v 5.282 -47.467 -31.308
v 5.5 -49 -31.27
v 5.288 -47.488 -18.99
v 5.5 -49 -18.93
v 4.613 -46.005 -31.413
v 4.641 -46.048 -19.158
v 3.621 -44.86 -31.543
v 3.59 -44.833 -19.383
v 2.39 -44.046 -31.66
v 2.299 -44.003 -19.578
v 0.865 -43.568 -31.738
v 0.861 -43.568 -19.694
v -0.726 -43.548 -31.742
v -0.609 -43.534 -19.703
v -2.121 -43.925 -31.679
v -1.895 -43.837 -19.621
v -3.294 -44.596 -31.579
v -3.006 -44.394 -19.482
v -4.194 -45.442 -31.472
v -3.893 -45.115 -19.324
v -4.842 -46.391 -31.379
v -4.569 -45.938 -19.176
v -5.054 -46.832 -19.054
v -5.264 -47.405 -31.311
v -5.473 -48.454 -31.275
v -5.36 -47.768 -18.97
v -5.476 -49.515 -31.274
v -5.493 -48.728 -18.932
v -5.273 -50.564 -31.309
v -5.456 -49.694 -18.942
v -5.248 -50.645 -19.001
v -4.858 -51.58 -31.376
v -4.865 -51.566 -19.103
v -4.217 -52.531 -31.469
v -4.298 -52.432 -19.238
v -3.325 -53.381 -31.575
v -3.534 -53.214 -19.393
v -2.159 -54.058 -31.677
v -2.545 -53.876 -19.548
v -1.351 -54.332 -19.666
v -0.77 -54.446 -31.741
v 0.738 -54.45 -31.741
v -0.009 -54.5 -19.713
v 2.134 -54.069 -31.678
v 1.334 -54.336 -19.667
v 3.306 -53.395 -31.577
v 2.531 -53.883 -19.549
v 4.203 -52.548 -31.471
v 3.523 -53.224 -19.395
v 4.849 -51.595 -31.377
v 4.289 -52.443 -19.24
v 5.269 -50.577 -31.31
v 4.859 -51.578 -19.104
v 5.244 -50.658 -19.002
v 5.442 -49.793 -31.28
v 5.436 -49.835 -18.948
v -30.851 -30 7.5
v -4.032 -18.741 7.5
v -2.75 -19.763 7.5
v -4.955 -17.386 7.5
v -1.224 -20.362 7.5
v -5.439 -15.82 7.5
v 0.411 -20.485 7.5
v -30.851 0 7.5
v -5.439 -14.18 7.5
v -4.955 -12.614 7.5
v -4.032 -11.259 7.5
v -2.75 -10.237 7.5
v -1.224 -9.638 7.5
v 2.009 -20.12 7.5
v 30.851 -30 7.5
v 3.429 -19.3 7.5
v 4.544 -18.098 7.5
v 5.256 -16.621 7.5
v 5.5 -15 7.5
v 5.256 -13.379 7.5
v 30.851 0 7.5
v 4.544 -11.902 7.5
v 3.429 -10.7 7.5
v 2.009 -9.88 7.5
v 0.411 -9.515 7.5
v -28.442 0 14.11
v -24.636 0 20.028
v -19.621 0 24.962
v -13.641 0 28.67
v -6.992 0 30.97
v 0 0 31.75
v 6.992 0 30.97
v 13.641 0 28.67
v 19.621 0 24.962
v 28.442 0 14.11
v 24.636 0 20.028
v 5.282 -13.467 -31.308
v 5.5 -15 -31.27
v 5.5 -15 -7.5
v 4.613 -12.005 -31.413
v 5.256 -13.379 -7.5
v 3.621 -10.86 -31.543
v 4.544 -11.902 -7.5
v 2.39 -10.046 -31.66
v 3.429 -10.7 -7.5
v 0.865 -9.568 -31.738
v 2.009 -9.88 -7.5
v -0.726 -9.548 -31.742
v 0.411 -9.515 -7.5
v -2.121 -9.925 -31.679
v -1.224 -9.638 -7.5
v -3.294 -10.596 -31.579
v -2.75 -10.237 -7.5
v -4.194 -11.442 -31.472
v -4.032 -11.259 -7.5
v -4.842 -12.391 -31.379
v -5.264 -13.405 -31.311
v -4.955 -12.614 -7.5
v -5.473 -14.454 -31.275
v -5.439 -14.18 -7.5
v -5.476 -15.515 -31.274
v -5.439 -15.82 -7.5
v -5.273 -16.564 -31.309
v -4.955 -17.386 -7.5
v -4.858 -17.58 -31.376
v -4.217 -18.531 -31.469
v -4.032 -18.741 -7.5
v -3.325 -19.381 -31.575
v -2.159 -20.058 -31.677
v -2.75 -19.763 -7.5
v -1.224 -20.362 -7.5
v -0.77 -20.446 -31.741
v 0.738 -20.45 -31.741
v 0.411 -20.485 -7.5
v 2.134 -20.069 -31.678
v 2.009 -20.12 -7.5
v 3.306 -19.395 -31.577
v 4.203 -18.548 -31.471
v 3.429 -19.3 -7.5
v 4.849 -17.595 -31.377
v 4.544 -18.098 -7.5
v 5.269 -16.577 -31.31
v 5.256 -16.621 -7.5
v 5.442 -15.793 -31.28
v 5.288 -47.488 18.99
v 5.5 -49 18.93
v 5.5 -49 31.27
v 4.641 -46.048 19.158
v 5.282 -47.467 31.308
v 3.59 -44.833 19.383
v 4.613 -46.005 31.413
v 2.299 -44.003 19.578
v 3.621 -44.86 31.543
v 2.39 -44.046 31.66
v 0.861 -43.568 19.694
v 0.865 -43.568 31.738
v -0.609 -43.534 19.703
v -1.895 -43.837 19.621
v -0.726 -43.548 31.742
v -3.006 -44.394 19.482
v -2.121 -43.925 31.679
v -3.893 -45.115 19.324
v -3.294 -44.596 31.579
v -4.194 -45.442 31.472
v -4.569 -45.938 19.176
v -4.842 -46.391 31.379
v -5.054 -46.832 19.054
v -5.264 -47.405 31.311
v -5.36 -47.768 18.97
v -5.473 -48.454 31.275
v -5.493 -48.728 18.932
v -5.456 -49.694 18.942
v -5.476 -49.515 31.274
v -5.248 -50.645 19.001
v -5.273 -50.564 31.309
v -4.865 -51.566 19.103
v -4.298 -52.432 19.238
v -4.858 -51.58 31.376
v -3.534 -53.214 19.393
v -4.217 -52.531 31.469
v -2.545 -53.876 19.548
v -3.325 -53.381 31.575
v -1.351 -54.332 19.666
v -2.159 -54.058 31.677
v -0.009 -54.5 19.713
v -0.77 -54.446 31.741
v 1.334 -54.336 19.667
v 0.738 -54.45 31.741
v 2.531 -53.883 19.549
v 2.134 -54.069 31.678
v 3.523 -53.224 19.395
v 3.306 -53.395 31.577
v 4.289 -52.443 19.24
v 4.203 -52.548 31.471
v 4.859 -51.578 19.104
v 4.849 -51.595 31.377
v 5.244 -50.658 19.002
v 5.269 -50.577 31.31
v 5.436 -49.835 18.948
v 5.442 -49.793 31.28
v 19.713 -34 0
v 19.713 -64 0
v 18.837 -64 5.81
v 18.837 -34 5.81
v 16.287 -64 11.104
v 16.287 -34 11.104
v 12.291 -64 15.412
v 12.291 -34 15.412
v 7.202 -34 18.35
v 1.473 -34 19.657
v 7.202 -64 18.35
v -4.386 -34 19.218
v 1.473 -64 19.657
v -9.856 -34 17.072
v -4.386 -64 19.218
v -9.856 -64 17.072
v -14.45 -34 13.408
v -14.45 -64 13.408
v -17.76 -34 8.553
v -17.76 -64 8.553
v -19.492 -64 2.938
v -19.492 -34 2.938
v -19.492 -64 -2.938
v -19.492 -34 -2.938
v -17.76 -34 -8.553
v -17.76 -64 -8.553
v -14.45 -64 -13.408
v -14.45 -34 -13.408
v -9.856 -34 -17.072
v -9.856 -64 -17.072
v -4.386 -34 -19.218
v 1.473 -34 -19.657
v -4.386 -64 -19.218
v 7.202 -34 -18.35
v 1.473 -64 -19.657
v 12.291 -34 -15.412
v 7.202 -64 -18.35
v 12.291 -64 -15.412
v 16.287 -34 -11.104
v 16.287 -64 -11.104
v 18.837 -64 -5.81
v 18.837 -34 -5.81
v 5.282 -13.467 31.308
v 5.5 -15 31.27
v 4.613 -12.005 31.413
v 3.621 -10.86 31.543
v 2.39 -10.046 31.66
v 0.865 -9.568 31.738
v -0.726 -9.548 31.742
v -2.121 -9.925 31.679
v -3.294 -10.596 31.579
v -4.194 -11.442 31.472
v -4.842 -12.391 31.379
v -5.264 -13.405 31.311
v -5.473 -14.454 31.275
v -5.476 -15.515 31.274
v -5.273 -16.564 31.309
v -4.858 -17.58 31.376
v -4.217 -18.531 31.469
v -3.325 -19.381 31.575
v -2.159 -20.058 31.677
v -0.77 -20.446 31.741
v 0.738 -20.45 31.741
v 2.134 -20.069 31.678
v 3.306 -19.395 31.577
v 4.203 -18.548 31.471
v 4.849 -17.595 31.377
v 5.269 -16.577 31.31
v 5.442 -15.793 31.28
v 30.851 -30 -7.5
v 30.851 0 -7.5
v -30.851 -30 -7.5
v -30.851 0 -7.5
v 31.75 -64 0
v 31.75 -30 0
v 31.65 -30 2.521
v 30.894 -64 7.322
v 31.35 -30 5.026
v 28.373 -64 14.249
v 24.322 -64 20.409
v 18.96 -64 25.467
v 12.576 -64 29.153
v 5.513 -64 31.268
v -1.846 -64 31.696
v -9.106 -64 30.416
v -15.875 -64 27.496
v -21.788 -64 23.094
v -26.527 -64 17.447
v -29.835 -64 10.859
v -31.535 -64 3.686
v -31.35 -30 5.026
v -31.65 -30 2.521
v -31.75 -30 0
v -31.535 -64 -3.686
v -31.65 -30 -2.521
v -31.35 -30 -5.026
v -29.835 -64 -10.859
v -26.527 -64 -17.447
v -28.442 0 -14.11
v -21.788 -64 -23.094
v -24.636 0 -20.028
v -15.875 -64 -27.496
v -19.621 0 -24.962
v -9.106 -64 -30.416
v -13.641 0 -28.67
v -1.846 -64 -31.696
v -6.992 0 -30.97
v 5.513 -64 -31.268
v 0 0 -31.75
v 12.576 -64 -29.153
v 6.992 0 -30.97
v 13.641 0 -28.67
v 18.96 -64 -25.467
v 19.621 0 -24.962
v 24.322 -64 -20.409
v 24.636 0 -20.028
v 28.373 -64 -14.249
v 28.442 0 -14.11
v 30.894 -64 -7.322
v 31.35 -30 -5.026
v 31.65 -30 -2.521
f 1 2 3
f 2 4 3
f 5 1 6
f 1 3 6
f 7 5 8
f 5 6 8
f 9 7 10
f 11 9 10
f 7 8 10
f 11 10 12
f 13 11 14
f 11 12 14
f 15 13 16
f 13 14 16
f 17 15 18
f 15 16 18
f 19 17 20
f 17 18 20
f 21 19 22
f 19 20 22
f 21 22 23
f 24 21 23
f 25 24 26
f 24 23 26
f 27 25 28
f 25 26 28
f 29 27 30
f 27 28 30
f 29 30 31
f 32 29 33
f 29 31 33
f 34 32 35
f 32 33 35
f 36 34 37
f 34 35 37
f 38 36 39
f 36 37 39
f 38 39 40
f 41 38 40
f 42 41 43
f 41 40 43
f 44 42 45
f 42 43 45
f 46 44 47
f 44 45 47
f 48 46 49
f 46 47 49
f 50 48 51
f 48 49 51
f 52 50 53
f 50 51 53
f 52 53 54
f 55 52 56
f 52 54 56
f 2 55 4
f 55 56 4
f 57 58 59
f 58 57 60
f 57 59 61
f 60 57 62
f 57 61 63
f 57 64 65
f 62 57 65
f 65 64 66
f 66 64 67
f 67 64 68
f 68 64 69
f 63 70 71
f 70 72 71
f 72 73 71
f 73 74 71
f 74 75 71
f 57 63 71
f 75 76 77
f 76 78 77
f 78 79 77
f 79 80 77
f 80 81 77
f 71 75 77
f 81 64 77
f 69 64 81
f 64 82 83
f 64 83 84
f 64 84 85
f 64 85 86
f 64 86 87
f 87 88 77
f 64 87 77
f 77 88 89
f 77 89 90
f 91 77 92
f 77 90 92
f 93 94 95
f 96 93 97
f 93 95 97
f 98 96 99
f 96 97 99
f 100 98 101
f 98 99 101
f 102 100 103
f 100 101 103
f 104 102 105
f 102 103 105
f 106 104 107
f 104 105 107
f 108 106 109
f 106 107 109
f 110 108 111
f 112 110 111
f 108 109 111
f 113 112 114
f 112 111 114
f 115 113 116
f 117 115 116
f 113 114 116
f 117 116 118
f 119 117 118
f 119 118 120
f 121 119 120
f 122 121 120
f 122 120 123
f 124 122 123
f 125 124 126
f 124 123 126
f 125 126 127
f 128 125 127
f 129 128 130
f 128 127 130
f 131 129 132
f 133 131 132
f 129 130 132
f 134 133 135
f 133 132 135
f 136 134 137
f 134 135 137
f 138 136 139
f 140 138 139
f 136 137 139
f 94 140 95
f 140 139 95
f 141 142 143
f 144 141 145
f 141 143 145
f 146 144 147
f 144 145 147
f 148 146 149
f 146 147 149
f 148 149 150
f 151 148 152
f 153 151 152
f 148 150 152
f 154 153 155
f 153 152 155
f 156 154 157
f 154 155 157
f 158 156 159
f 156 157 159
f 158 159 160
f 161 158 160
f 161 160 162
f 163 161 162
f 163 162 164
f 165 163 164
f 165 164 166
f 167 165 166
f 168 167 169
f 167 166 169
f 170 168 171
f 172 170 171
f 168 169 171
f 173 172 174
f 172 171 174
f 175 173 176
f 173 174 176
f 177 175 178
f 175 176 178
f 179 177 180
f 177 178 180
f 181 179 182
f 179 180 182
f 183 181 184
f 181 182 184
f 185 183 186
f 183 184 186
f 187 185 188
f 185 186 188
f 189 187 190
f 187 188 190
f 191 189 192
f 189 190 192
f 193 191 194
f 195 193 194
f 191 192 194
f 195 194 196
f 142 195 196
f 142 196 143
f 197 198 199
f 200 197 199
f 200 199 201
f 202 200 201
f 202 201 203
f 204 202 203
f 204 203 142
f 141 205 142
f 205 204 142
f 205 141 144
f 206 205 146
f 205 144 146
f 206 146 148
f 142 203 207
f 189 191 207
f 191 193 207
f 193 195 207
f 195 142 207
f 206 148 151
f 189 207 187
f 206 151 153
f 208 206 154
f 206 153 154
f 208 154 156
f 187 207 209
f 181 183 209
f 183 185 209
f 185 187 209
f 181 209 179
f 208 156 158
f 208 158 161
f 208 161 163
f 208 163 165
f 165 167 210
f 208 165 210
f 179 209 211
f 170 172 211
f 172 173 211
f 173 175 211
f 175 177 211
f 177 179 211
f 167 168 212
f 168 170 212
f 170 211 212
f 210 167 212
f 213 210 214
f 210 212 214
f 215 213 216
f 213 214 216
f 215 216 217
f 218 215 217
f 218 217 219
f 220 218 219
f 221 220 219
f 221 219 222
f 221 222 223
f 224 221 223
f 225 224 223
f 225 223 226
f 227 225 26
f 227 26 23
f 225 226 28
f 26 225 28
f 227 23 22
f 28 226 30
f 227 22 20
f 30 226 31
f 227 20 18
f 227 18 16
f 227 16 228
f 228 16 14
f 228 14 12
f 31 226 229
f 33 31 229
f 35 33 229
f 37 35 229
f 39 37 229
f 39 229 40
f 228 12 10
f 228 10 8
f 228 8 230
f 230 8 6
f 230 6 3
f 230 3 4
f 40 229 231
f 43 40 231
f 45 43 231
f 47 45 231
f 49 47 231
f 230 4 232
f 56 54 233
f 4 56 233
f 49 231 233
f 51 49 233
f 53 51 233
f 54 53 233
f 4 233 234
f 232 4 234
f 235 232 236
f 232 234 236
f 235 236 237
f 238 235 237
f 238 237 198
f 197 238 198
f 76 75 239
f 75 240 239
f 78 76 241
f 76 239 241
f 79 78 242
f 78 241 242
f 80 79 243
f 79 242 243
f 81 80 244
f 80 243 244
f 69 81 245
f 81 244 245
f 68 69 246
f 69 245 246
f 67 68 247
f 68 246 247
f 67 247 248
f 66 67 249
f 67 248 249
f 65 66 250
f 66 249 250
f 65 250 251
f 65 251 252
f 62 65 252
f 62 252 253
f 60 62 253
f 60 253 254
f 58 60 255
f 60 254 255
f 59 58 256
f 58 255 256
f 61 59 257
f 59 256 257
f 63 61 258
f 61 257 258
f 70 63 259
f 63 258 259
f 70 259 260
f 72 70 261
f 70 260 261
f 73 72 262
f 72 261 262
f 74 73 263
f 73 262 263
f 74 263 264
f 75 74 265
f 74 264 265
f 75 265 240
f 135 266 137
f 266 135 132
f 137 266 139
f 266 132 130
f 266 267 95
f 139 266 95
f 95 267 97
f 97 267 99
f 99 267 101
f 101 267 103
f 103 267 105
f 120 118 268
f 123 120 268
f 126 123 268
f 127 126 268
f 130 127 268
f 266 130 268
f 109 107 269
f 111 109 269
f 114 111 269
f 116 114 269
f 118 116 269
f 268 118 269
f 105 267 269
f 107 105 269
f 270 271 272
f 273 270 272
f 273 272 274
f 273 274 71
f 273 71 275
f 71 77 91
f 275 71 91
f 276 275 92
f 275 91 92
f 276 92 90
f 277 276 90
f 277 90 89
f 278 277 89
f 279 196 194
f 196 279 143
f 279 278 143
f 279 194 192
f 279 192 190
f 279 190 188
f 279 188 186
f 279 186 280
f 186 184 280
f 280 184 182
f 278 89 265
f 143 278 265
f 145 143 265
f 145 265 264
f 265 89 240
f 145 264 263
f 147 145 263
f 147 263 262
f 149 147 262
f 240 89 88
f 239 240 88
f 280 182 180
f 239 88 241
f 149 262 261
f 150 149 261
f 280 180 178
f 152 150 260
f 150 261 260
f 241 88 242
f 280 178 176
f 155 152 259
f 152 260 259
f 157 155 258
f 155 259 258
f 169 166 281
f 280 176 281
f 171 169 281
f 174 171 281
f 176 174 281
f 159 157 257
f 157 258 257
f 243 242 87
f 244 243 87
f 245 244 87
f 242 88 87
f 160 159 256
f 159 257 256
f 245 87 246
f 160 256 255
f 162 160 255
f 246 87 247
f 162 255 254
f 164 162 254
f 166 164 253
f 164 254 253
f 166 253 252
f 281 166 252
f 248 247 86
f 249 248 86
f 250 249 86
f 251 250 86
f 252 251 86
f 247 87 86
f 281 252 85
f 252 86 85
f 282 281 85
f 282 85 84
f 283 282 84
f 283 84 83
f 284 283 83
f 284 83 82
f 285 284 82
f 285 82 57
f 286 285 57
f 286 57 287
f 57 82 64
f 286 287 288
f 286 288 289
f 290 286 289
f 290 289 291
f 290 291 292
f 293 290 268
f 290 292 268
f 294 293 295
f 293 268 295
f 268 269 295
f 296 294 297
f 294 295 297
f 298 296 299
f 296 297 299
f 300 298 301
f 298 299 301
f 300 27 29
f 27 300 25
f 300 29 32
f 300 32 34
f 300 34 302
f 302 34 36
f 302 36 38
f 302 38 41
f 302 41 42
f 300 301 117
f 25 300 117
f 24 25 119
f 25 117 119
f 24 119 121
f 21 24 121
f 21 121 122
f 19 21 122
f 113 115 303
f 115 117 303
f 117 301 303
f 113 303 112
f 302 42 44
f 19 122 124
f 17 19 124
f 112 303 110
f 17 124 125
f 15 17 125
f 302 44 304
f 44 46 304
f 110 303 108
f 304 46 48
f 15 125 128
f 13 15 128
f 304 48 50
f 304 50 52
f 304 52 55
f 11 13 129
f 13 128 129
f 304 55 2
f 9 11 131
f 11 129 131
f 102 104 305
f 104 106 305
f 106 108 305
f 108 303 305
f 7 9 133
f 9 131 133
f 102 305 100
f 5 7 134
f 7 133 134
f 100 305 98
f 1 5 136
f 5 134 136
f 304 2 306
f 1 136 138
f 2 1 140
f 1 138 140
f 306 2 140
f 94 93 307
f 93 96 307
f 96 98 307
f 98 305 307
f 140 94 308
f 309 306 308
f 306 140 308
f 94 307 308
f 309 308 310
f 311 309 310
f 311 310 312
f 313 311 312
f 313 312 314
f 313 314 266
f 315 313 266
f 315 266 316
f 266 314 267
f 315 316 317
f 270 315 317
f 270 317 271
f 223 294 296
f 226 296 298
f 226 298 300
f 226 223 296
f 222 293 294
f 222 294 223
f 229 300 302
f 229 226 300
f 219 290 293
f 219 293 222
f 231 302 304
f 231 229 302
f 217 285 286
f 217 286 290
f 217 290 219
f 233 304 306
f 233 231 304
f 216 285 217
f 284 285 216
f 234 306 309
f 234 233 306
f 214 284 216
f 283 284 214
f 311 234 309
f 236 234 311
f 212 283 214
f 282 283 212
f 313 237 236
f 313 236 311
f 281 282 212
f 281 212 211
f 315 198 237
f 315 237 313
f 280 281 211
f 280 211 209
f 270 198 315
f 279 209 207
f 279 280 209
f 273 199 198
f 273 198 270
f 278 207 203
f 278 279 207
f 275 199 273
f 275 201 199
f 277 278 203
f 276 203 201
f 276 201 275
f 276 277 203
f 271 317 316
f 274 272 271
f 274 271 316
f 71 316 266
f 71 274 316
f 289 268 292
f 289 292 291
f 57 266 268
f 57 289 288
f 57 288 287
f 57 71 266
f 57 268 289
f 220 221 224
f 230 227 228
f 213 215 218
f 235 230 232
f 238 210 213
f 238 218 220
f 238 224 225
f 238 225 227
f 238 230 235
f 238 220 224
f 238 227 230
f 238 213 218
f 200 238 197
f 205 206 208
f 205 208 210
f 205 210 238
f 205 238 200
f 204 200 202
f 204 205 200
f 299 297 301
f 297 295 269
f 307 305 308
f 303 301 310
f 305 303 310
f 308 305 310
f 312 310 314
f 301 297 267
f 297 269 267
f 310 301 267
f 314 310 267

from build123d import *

# Parameters (mm, degrees)
F0_R     = 31.75
F1_DEPTH = 64
F2_R     = 19.7125485486
F3_DEPTH = 30
F5_DEPTH = 30
F6_R     = 5.5
F7_DEPTH = 35
F8_R     = 5.5
F9_DEPTH = 35


# Not quite as in the source:
# - the program builds the solid bodies; features that only make, move or delete a surface that nothing else refers to are left out


with BuildPart() as f1:
    # F0 (on Front) → F1 (new body)
    with BuildSketch(Plane.XZ):
        Circle(F0_R)
    extrude(amount=F1_DEPTH)

    # F2 (on face) → F3 (cut)
    with BuildSketch(Plane.XZ.offset(64)):
        Circle(F2_R)
    extrude(amount=-F3_DEPTH, mode=Mode.SUBTRACT)

    # F4 (on face) → F5 (cut)
    with BuildSketch(Plane(origin=(0, 0, 0), x_dir=(-1, 0, 0), z_dir=(0, 1, 0))):
        with BuildLine():
            Line((-30.8514586365, -7.5), (30.8514586365, -7.5))
            ThreePointArc((30.8514586365, -7.5), (31.5245643246, -3.7768166682), (31.75, 0))
            ThreePointArc((31.75, 0), (31.5245643246, 3.7768166682), (30.8514586365, 7.5))
            Line((30.8514586365, 7.5), (-30.8514586365, 7.5))
            ThreePointArc((-30.8514586365, 7.5), (-31.75, 0), (-30.8514586365, -7.5))
        make_face()
    extrude(amount=-F5_DEPTH, mode=Mode.SUBTRACT)

    # F6 (on Top) → F7 (cut, symmetric)
    with BuildSketch(Plane.XY):
        with Locations((0, -49)):
            Circle(F6_R)
    extrude(amount=F7_DEPTH, both=True, mode=Mode.SUBTRACT)

    # F8 (on Top) → F9 (cut, symmetric)
    with BuildSketch(Plane.XY):
        with Locations((0, -15)):
            Circle(F8_R)
    extrude(amount=F9_DEPTH, both=True, mode=Mode.SUBTRACT)


solid = f1.part
